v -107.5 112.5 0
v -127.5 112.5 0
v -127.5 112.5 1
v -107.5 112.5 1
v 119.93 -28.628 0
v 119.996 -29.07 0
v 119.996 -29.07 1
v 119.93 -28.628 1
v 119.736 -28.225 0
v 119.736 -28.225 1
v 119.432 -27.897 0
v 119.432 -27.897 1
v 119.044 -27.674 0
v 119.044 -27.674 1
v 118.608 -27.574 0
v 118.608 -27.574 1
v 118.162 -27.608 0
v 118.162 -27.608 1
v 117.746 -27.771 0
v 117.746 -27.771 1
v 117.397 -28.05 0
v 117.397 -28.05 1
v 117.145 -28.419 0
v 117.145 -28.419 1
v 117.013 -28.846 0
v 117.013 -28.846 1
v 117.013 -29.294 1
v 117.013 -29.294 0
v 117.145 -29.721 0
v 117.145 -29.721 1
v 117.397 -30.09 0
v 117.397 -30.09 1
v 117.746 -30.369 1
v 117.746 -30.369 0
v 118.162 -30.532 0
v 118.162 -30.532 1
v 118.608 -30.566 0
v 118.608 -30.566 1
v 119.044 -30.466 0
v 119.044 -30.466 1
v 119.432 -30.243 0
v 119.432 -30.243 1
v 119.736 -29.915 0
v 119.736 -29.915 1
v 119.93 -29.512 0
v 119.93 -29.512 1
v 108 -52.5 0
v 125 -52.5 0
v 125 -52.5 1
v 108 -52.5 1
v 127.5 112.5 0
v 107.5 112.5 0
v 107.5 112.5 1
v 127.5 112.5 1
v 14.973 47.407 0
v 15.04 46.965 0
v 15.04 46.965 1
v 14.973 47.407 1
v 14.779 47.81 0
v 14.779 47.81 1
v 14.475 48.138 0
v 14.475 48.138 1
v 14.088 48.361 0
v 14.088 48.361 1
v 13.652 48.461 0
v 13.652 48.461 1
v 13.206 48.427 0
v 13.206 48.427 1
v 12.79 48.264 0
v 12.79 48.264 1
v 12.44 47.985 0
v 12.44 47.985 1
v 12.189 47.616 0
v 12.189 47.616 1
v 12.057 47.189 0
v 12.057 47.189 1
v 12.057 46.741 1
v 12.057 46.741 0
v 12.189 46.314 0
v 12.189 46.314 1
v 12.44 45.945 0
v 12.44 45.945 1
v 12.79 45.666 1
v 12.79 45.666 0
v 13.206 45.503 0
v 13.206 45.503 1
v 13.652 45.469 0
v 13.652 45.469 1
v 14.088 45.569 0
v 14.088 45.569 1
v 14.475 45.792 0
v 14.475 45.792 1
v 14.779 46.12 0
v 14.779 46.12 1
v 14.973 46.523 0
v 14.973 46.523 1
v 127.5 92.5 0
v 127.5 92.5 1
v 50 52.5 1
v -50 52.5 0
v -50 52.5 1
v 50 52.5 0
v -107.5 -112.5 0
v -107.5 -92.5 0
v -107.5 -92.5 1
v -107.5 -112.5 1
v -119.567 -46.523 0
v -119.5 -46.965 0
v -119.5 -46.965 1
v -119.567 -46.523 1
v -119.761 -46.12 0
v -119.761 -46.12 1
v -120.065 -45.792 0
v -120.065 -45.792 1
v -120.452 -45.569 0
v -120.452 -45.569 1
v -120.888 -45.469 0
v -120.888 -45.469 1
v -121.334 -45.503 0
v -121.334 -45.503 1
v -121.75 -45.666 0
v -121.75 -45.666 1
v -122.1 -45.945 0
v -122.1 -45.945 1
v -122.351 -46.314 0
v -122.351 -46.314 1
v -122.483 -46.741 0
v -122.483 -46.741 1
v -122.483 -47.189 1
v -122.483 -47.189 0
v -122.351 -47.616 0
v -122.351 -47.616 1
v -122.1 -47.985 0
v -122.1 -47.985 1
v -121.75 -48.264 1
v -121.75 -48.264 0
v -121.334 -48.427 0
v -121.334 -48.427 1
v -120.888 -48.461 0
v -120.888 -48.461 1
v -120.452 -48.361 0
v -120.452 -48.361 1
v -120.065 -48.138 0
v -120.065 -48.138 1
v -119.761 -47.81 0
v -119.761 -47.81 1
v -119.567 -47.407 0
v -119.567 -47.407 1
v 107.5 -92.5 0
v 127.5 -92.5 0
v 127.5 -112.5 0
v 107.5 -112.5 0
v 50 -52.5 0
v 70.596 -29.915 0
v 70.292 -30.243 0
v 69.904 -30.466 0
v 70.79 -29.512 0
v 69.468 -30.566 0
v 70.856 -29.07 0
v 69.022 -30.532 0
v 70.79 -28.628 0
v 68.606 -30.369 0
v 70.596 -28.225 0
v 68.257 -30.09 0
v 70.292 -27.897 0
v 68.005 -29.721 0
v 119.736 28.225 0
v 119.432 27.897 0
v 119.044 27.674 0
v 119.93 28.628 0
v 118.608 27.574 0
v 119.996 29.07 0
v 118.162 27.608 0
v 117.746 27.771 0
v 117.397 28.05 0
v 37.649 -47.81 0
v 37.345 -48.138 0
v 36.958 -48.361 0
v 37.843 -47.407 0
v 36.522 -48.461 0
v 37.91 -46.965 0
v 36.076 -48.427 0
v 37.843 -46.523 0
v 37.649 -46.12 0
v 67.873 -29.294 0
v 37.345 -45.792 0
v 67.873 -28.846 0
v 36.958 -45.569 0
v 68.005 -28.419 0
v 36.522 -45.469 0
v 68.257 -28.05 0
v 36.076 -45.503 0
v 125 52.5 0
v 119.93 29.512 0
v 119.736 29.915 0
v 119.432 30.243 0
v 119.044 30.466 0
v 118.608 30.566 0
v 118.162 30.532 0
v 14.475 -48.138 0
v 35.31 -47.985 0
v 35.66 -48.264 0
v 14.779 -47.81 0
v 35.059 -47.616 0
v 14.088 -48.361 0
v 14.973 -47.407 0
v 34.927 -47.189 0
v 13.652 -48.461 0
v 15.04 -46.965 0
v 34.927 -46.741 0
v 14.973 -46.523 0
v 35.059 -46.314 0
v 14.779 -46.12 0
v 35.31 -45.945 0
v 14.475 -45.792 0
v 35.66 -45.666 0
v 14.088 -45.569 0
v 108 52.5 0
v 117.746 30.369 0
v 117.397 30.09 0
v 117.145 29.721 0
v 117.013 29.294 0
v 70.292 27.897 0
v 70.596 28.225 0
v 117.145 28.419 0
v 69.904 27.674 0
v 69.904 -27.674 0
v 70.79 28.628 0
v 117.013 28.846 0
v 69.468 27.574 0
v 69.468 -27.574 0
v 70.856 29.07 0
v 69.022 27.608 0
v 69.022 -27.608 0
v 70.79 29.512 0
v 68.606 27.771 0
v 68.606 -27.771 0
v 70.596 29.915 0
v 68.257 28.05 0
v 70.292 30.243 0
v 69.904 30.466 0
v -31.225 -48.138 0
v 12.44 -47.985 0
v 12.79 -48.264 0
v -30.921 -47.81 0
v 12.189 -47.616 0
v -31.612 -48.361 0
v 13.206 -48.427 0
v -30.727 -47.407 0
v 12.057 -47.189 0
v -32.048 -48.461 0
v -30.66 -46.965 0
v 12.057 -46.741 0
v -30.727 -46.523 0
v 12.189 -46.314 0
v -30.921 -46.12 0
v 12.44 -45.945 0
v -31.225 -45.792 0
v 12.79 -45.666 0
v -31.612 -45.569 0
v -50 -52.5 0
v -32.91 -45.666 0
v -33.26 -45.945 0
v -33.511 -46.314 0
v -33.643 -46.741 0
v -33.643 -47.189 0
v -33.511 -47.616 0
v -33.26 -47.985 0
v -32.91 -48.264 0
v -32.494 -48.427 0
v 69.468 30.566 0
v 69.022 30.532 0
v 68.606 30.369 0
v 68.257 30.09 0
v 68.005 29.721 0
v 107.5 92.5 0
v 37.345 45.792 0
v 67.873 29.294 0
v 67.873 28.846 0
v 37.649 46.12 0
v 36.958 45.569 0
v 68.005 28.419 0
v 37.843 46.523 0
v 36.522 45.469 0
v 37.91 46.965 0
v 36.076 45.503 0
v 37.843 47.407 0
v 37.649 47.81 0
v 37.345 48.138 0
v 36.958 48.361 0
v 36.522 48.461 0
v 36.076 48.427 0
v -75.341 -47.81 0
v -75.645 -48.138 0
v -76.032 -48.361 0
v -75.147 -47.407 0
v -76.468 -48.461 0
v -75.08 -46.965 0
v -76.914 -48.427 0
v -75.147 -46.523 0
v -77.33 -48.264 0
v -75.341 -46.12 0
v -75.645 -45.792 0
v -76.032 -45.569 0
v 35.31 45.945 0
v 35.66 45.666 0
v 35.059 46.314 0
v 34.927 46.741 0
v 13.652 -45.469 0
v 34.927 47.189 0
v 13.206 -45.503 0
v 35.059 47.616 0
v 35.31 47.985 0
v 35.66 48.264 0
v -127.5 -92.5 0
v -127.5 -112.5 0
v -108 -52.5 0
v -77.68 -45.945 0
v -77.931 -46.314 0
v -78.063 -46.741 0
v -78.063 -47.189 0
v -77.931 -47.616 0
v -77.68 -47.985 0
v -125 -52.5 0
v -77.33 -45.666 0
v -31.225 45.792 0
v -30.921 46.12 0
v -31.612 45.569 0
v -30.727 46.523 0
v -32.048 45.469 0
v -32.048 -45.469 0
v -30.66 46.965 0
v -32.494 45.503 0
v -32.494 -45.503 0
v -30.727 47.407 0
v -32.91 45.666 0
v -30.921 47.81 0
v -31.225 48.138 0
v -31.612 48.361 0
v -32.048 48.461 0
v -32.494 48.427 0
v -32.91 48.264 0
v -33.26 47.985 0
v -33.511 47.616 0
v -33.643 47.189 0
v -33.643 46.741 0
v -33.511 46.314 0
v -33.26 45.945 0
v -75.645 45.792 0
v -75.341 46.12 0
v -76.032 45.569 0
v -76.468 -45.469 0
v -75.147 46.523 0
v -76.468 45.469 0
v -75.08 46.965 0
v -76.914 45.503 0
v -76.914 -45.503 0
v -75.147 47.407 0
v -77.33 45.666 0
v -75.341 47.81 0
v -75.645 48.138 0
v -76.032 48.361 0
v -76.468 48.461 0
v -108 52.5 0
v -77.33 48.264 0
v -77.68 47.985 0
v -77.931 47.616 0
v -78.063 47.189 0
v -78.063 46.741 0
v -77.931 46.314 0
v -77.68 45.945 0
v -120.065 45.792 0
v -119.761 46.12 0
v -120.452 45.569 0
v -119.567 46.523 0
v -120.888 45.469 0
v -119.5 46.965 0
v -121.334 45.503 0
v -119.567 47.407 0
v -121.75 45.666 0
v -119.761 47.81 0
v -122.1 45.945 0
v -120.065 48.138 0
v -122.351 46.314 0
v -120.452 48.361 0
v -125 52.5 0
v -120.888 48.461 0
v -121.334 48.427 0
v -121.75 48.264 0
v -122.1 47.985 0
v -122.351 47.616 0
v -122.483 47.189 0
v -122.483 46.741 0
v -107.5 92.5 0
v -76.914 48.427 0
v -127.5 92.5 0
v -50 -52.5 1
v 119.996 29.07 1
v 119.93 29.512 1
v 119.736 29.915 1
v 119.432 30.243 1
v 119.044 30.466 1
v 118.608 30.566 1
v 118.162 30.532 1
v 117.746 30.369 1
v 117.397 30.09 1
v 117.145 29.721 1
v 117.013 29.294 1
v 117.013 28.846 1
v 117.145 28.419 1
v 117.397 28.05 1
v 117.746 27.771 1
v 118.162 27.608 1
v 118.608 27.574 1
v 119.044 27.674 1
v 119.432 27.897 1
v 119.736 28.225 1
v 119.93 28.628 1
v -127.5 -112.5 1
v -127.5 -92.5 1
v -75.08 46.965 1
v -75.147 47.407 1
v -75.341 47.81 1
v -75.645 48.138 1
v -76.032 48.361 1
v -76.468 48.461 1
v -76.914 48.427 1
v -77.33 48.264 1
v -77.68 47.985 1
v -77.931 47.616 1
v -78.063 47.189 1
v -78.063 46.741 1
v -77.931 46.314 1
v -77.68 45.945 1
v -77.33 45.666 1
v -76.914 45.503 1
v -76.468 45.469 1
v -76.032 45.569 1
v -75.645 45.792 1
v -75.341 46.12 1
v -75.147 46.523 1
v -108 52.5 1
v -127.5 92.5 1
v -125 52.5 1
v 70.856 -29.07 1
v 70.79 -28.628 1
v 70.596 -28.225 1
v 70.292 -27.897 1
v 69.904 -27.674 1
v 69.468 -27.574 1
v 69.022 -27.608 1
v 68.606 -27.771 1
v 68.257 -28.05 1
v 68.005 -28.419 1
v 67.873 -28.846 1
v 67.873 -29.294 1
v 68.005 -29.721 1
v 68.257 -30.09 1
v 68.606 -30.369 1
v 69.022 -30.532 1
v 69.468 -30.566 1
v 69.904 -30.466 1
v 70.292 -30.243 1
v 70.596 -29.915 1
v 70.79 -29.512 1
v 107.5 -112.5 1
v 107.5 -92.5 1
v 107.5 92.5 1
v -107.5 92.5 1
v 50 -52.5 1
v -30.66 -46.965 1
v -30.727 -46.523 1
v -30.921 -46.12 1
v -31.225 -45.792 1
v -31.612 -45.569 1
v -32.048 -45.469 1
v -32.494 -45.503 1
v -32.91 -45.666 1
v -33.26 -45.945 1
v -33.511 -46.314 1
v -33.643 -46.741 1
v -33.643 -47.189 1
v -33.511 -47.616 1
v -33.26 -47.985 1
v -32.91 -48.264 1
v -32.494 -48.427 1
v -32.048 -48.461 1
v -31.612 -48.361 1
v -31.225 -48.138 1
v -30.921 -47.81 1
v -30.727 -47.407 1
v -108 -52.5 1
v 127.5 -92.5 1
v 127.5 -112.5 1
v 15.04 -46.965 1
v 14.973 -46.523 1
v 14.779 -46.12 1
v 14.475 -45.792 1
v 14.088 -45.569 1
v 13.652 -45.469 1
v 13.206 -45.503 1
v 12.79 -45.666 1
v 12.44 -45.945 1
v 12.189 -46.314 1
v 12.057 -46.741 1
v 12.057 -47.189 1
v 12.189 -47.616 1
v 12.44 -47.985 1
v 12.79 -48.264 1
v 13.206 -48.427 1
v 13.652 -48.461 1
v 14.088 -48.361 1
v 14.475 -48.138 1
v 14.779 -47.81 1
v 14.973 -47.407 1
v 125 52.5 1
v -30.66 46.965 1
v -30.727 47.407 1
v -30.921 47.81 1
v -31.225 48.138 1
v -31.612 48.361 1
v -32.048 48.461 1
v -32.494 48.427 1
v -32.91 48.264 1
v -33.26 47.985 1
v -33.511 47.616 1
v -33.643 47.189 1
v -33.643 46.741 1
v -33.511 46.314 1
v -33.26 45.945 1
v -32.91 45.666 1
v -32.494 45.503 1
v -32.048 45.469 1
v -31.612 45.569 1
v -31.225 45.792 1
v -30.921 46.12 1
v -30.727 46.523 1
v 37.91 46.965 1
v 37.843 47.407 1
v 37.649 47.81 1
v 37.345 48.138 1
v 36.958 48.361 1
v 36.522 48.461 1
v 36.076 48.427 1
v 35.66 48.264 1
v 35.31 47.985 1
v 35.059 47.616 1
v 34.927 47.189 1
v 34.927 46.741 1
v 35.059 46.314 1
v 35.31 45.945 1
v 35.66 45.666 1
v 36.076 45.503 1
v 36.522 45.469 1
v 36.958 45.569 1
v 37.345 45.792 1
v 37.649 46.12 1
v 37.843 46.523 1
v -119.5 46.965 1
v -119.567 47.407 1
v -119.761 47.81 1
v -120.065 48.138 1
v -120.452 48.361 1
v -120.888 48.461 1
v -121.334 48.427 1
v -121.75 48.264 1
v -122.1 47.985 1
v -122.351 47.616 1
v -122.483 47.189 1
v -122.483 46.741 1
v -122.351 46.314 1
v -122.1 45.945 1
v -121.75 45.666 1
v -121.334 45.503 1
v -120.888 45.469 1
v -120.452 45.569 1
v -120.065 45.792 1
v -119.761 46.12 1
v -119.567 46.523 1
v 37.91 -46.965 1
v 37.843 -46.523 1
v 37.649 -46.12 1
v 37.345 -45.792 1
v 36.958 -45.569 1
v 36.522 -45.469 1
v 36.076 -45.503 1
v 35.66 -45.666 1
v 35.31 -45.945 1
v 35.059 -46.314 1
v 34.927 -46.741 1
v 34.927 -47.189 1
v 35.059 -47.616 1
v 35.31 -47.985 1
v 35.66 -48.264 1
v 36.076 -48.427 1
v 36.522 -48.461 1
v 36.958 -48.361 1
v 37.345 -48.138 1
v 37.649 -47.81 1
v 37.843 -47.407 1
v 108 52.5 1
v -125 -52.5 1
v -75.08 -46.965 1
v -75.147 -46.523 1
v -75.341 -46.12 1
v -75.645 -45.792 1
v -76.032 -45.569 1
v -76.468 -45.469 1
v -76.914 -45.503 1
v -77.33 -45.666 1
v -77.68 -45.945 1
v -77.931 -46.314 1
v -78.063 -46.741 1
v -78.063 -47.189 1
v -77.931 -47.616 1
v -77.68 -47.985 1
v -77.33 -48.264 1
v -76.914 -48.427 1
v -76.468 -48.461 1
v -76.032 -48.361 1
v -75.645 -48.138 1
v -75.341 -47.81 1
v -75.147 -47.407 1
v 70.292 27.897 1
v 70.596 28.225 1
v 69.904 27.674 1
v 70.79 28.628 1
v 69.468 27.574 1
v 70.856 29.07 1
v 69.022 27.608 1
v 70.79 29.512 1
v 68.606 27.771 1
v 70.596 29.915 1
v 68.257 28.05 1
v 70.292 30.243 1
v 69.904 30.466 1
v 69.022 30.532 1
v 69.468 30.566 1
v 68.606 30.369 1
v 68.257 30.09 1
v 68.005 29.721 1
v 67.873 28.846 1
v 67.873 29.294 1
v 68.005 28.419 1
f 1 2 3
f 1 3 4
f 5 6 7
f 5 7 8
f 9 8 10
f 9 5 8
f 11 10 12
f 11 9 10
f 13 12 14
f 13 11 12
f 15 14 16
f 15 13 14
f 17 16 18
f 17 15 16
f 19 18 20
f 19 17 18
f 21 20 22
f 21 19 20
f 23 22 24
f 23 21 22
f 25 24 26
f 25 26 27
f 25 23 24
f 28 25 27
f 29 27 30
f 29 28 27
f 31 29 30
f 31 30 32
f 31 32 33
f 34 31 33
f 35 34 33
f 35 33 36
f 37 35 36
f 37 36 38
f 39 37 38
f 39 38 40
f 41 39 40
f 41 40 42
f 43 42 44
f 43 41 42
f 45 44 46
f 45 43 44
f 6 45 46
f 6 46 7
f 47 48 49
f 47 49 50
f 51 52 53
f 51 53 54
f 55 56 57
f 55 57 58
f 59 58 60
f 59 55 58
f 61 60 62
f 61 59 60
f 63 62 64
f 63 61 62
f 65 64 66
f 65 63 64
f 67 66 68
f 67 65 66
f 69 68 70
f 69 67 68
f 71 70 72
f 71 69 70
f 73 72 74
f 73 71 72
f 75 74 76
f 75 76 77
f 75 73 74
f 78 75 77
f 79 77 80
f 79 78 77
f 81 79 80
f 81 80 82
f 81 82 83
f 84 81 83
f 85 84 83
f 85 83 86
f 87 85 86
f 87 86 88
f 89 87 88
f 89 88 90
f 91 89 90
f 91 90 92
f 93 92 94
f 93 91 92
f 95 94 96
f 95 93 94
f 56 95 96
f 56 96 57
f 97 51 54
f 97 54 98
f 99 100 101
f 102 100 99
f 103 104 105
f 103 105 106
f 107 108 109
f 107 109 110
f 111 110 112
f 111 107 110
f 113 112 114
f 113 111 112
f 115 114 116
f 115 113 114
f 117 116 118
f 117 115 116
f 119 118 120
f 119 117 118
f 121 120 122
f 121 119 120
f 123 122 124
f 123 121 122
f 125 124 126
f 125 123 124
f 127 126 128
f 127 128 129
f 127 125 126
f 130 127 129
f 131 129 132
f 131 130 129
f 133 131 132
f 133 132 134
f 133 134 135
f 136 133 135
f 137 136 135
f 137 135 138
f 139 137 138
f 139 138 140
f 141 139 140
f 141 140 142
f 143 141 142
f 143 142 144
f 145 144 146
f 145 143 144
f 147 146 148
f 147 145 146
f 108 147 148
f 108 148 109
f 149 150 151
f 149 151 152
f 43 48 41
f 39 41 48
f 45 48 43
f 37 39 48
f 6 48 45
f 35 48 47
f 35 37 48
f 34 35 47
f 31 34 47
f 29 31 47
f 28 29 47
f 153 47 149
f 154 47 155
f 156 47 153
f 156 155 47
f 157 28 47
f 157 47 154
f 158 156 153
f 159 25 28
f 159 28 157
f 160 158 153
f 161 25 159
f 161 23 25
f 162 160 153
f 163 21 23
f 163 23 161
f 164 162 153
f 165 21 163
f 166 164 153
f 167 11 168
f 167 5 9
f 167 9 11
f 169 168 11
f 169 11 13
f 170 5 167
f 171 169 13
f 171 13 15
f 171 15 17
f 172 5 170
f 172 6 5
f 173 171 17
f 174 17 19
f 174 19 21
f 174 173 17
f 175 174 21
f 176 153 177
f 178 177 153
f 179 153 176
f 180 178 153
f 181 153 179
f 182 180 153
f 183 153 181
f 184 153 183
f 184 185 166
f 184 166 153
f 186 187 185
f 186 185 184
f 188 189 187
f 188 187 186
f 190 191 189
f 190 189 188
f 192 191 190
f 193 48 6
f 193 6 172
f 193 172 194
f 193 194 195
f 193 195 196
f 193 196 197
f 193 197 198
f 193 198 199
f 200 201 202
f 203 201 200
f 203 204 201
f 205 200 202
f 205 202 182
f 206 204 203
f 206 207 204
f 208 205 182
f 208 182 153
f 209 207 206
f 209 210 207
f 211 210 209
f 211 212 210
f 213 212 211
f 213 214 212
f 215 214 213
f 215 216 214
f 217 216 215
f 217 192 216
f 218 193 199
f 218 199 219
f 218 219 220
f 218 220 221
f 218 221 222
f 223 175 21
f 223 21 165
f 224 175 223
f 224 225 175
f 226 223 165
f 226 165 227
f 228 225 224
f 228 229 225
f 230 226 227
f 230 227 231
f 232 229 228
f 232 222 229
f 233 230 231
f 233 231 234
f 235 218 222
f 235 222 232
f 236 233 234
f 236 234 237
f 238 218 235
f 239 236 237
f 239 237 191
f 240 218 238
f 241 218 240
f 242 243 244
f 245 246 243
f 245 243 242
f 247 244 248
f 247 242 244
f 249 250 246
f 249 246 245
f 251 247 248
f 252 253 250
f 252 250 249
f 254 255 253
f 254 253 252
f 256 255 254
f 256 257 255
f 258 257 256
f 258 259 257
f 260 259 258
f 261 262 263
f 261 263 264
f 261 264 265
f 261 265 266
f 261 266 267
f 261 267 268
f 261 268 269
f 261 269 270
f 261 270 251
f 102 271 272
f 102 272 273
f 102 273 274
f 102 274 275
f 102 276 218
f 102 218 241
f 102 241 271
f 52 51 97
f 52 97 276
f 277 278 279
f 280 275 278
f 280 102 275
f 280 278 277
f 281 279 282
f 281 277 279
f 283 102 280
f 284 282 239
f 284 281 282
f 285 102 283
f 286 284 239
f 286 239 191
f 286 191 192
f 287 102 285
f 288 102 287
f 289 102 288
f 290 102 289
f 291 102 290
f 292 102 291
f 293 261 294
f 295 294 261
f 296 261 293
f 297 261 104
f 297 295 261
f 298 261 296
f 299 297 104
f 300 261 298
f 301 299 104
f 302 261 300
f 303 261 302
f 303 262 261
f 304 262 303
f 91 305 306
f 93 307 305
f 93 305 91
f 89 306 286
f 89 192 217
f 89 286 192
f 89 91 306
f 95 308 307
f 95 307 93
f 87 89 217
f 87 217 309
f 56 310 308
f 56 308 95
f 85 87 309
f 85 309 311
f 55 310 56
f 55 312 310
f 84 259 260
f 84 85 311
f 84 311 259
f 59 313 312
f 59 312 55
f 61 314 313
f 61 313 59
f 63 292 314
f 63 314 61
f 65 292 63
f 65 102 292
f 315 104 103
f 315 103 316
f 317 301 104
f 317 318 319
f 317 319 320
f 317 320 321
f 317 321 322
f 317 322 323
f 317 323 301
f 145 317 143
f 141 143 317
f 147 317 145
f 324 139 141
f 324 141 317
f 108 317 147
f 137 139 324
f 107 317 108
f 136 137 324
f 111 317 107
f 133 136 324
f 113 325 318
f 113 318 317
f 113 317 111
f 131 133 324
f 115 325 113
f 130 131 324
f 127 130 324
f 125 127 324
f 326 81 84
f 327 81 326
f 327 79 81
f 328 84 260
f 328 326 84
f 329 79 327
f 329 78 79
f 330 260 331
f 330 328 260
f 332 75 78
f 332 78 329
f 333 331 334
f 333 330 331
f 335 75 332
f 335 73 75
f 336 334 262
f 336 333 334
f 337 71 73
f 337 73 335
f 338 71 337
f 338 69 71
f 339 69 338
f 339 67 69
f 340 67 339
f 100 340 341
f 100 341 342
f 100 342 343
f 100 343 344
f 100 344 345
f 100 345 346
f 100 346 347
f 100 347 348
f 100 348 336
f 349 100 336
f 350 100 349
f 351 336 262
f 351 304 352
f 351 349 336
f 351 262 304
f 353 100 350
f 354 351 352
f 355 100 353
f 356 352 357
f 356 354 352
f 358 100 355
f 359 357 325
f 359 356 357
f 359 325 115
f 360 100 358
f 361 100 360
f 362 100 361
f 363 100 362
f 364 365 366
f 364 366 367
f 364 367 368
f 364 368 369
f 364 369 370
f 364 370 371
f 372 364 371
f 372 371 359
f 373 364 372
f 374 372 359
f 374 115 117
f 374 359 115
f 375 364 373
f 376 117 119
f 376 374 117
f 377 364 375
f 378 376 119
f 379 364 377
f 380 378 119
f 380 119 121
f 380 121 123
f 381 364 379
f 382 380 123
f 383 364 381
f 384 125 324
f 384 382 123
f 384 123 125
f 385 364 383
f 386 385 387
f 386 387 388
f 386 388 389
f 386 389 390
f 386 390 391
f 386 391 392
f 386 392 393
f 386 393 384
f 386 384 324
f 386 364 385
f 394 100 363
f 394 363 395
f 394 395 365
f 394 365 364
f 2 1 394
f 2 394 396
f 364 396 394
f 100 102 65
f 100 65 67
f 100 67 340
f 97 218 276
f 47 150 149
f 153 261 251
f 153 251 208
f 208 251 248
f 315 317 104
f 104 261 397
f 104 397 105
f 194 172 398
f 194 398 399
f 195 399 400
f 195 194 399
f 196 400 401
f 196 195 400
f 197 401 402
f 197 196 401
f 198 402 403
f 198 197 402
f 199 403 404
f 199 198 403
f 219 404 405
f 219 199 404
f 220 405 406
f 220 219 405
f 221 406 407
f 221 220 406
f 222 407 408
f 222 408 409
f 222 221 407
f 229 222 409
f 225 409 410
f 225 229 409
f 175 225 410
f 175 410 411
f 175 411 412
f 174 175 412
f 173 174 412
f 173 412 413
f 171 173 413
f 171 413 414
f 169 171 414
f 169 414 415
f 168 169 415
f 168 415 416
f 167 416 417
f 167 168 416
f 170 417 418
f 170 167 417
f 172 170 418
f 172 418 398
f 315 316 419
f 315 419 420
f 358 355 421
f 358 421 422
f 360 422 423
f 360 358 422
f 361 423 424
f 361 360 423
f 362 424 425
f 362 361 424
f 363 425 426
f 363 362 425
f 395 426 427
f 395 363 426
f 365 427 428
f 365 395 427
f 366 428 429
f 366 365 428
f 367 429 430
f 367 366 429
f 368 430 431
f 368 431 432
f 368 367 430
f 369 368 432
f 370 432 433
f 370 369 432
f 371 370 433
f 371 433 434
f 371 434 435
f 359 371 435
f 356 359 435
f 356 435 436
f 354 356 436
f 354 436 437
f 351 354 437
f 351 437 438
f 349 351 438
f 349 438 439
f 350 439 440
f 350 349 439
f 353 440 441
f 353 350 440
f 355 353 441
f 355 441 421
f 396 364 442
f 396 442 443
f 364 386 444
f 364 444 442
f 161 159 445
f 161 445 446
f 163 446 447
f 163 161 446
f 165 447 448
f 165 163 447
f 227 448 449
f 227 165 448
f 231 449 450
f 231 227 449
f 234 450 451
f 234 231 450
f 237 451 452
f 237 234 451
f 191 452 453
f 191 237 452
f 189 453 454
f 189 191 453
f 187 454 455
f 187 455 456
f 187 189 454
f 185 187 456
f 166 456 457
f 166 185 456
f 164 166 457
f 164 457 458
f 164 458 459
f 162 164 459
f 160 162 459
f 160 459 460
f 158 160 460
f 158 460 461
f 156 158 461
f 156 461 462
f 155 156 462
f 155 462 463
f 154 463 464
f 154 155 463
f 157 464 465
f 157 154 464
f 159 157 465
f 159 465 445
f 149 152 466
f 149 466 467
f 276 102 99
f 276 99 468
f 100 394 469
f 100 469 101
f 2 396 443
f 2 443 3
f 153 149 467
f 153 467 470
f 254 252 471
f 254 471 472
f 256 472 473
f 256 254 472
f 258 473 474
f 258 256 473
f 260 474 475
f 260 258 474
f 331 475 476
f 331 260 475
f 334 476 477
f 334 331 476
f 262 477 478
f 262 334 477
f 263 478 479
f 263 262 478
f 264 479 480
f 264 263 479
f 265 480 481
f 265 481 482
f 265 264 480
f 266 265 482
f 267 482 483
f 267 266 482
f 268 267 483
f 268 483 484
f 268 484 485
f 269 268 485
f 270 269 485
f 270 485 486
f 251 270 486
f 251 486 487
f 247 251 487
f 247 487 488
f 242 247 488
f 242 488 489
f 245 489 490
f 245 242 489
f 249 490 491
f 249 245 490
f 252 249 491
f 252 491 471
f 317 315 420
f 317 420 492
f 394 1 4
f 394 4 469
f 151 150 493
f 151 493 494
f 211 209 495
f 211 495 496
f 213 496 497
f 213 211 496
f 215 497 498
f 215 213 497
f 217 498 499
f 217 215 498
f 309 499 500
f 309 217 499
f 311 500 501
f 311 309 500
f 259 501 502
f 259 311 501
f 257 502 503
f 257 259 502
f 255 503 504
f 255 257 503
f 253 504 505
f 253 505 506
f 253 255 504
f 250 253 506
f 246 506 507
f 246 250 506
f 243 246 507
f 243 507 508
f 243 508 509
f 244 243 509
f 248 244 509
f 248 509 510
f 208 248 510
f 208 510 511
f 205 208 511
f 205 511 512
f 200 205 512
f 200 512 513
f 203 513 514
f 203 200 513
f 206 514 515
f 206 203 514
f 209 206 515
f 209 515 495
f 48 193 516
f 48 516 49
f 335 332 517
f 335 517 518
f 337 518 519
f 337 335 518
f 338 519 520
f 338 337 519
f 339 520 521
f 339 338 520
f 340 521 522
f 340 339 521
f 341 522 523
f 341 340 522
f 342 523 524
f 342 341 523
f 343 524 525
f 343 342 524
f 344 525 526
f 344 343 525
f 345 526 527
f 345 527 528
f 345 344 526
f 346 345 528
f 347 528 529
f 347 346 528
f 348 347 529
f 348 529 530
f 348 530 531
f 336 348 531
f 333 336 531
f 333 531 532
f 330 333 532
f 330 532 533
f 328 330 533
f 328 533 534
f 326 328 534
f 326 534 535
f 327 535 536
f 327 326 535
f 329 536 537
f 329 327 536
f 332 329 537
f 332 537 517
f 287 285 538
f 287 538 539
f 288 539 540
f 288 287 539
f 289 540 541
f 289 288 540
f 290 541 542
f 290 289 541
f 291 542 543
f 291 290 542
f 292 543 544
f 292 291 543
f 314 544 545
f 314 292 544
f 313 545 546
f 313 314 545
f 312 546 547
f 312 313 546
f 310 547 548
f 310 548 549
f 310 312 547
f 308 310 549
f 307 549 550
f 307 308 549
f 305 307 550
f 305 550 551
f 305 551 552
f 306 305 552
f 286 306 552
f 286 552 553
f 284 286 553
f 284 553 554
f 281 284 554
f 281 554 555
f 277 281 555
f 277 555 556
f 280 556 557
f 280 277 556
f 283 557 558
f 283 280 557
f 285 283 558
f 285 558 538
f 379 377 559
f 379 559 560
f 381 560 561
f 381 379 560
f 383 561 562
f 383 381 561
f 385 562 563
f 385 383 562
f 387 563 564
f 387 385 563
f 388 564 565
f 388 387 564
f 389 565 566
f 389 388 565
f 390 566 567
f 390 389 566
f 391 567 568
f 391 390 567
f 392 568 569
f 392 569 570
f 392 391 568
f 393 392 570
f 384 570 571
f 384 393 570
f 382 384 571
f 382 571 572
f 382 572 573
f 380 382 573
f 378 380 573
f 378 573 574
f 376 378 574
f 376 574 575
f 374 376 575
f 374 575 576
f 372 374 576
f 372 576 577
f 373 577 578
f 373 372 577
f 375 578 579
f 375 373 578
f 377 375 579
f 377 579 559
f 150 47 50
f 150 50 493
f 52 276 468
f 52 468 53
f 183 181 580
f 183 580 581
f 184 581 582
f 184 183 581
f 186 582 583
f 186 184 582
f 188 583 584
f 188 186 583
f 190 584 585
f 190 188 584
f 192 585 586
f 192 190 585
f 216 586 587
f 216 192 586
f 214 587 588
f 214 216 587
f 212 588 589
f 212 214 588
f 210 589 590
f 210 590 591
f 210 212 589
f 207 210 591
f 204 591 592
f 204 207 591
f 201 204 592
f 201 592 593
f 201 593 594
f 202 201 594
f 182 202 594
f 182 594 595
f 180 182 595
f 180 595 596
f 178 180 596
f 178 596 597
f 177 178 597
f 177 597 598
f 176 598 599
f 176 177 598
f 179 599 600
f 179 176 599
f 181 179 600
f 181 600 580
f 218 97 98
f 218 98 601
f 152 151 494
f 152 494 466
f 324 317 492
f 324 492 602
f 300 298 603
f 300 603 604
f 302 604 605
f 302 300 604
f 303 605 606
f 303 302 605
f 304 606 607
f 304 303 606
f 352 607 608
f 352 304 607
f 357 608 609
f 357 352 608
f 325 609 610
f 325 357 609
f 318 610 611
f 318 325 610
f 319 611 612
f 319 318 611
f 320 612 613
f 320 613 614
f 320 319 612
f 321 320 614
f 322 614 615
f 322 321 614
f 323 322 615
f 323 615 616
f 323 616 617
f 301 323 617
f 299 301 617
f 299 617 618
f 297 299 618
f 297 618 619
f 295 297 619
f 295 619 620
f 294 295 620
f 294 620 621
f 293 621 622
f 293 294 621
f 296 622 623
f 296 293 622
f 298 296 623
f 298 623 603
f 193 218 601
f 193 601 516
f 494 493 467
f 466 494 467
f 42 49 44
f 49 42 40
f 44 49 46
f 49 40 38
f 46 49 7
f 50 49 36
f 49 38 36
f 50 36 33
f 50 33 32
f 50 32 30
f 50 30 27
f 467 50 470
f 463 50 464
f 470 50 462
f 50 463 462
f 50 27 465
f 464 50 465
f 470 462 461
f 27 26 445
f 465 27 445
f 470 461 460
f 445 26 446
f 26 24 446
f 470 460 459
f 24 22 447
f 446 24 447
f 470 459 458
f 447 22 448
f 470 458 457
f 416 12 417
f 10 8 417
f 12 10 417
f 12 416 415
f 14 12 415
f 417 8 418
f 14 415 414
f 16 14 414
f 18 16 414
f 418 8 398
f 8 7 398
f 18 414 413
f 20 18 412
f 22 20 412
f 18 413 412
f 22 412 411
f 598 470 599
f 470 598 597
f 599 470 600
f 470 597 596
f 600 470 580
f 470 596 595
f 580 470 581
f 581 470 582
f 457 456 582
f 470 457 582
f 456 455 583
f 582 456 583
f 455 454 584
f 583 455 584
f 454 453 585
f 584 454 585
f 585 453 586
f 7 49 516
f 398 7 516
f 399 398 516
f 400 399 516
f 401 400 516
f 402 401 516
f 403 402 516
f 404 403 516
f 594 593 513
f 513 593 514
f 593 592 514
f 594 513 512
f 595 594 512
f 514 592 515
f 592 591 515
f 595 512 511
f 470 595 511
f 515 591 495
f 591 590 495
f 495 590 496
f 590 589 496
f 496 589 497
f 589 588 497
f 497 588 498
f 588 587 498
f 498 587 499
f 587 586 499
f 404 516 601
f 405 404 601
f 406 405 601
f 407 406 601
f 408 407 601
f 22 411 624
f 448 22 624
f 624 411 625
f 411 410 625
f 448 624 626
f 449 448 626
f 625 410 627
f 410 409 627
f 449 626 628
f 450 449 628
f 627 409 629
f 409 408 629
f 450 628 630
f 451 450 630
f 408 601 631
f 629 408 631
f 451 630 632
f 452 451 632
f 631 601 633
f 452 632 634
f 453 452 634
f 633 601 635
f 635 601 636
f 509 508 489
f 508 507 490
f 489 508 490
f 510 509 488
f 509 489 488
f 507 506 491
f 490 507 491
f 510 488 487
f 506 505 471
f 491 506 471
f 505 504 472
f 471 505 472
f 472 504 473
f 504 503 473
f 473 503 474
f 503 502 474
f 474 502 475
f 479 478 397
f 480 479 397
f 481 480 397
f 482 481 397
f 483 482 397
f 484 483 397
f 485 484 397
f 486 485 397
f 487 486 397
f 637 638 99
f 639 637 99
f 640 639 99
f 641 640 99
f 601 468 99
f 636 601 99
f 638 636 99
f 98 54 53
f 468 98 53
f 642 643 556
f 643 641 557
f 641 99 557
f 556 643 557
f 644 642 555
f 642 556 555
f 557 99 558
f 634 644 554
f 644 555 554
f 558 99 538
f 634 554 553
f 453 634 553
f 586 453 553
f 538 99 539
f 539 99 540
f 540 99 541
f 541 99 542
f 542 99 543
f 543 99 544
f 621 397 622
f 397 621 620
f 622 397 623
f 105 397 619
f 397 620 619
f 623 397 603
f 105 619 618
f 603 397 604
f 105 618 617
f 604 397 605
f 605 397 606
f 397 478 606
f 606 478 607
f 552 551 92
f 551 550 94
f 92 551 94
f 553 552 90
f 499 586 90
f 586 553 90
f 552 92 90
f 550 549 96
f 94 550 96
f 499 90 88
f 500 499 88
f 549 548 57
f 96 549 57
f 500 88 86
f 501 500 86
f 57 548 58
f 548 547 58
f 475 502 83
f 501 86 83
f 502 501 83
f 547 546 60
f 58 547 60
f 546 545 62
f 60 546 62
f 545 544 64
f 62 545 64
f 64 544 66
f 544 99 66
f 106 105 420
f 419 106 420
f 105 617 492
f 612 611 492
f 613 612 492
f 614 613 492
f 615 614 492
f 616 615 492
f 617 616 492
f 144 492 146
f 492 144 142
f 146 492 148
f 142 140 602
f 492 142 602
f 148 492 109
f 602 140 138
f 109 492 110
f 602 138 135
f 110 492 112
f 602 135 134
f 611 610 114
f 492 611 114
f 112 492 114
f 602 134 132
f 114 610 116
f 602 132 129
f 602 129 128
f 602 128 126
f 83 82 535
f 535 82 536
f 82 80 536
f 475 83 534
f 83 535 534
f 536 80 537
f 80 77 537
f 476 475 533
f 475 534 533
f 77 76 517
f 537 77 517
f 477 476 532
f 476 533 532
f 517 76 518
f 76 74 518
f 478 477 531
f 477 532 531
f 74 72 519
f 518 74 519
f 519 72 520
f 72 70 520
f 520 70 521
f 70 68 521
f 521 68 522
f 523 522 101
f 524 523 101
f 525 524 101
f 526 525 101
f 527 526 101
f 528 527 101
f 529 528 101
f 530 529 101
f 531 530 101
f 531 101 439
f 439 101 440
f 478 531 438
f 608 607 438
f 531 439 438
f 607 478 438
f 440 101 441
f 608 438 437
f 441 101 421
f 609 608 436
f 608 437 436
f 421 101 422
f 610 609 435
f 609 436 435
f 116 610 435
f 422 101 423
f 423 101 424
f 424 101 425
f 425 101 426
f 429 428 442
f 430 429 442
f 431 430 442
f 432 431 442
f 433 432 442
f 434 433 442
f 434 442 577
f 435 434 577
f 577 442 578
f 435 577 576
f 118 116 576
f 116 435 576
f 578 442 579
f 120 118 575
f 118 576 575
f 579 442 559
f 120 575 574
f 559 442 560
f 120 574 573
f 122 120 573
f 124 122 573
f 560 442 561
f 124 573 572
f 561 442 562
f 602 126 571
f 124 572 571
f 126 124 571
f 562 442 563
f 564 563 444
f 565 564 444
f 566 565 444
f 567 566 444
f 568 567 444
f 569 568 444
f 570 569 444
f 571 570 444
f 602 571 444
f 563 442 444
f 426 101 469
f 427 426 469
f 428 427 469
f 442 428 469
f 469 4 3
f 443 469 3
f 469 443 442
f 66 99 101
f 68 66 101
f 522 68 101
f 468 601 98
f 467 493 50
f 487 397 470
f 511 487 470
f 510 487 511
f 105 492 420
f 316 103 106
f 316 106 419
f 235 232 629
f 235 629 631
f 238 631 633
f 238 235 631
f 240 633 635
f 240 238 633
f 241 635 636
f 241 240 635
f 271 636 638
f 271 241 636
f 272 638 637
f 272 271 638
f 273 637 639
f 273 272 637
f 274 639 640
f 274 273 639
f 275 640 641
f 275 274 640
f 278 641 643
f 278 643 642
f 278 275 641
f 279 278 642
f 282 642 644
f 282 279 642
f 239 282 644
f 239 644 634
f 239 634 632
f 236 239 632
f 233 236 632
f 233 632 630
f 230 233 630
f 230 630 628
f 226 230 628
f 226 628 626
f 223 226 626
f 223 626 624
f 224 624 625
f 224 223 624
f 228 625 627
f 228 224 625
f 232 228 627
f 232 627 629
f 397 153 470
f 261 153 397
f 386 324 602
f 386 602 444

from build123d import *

# Parameters (mm, degrees)
SKETCH_R  = 1.5
PAD_DEPTH = 1


with BuildPart() as part:
    # Sketch → Pad (new body)
    with BuildSketch(Plane.XY):
        Polygon((-125, 52.5), (-108, 52.5), (-127.5, 92.5), (-127.5, 112.5), (-107.5, 112.5), (-107.5, 92.5), (-50, 52.5), (50, 52.5), (107.5, 92.5), (107.5, 112.5), (127.5, 112.5), (127.5, 92.5), (108, 52.5), (125, 52.5), (125, -52.5), (108, -52.5), (127.5, -92.5), (127.5, -112.5), (107.5, -112.5), (107.5, -92.5), (50, -52.5), (-50, -52.5), (-107.5, -92.5), (-107.5, -112.5), (-127.5, -112.5), (-127.5, -92.5), (-108, -52.5), (-125, -52.5), align=None)
        with Locations((-121, -46.965)):
            Circle(SKETCH_R, mode=Mode.SUBTRACT)
        with Locations((-76.58, -46.965)):
            Circle(SKETCH_R, mode=Mode.SUBTRACT)
        with Locations((-32.16, -46.965)):
            Circle(SKETCH_R, mode=Mode.SUBTRACT)
        with Locations((13.54, -46.965)):
            Circle(SKETCH_R, mode=Mode.SUBTRACT)
        with Locations((36.41, -46.965)):
            Circle(SKETCH_R, mode=Mode.SUBTRACT)
        with Locations((36.41, 46.965)):
            Circle(SKETCH_R, mode=Mode.SUBTRACT)
        with Locations((13.54, 46.965)):
            Circle(SKETCH_R, mode=Mode.SUBTRACT)
        with Locations((-32.16, 46.965)):
            Circle(SKETCH_R, mode=Mode.SUBTRACT)
        with Locations((-76.58, 46.965)):
            Circle(SKETCH_R, mode=Mode.SUBTRACT)
        with Locations((-121, 46.965)):
            Circle(SKETCH_R, mode=Mode.SUBTRACT)
        with Locations((69.35627, 29.07)):
            Circle(SKETCH_R, mode=Mode.SUBTRACT)
        with Locations((118.49627, 29.07)):
            Circle(SKETCH_R, mode=Mode.SUBTRACT)
        with Locations((69.35627, -29.07)):
            Circle(SKETCH_R, mode=Mode.SUBTRACT)
        with Locations((118.49627, -29.07)):
            Circle(SKETCH_R, mode=Mode.SUBTRACT)
    extrude(amount=PAD_DEPTH)


solid = part.part
